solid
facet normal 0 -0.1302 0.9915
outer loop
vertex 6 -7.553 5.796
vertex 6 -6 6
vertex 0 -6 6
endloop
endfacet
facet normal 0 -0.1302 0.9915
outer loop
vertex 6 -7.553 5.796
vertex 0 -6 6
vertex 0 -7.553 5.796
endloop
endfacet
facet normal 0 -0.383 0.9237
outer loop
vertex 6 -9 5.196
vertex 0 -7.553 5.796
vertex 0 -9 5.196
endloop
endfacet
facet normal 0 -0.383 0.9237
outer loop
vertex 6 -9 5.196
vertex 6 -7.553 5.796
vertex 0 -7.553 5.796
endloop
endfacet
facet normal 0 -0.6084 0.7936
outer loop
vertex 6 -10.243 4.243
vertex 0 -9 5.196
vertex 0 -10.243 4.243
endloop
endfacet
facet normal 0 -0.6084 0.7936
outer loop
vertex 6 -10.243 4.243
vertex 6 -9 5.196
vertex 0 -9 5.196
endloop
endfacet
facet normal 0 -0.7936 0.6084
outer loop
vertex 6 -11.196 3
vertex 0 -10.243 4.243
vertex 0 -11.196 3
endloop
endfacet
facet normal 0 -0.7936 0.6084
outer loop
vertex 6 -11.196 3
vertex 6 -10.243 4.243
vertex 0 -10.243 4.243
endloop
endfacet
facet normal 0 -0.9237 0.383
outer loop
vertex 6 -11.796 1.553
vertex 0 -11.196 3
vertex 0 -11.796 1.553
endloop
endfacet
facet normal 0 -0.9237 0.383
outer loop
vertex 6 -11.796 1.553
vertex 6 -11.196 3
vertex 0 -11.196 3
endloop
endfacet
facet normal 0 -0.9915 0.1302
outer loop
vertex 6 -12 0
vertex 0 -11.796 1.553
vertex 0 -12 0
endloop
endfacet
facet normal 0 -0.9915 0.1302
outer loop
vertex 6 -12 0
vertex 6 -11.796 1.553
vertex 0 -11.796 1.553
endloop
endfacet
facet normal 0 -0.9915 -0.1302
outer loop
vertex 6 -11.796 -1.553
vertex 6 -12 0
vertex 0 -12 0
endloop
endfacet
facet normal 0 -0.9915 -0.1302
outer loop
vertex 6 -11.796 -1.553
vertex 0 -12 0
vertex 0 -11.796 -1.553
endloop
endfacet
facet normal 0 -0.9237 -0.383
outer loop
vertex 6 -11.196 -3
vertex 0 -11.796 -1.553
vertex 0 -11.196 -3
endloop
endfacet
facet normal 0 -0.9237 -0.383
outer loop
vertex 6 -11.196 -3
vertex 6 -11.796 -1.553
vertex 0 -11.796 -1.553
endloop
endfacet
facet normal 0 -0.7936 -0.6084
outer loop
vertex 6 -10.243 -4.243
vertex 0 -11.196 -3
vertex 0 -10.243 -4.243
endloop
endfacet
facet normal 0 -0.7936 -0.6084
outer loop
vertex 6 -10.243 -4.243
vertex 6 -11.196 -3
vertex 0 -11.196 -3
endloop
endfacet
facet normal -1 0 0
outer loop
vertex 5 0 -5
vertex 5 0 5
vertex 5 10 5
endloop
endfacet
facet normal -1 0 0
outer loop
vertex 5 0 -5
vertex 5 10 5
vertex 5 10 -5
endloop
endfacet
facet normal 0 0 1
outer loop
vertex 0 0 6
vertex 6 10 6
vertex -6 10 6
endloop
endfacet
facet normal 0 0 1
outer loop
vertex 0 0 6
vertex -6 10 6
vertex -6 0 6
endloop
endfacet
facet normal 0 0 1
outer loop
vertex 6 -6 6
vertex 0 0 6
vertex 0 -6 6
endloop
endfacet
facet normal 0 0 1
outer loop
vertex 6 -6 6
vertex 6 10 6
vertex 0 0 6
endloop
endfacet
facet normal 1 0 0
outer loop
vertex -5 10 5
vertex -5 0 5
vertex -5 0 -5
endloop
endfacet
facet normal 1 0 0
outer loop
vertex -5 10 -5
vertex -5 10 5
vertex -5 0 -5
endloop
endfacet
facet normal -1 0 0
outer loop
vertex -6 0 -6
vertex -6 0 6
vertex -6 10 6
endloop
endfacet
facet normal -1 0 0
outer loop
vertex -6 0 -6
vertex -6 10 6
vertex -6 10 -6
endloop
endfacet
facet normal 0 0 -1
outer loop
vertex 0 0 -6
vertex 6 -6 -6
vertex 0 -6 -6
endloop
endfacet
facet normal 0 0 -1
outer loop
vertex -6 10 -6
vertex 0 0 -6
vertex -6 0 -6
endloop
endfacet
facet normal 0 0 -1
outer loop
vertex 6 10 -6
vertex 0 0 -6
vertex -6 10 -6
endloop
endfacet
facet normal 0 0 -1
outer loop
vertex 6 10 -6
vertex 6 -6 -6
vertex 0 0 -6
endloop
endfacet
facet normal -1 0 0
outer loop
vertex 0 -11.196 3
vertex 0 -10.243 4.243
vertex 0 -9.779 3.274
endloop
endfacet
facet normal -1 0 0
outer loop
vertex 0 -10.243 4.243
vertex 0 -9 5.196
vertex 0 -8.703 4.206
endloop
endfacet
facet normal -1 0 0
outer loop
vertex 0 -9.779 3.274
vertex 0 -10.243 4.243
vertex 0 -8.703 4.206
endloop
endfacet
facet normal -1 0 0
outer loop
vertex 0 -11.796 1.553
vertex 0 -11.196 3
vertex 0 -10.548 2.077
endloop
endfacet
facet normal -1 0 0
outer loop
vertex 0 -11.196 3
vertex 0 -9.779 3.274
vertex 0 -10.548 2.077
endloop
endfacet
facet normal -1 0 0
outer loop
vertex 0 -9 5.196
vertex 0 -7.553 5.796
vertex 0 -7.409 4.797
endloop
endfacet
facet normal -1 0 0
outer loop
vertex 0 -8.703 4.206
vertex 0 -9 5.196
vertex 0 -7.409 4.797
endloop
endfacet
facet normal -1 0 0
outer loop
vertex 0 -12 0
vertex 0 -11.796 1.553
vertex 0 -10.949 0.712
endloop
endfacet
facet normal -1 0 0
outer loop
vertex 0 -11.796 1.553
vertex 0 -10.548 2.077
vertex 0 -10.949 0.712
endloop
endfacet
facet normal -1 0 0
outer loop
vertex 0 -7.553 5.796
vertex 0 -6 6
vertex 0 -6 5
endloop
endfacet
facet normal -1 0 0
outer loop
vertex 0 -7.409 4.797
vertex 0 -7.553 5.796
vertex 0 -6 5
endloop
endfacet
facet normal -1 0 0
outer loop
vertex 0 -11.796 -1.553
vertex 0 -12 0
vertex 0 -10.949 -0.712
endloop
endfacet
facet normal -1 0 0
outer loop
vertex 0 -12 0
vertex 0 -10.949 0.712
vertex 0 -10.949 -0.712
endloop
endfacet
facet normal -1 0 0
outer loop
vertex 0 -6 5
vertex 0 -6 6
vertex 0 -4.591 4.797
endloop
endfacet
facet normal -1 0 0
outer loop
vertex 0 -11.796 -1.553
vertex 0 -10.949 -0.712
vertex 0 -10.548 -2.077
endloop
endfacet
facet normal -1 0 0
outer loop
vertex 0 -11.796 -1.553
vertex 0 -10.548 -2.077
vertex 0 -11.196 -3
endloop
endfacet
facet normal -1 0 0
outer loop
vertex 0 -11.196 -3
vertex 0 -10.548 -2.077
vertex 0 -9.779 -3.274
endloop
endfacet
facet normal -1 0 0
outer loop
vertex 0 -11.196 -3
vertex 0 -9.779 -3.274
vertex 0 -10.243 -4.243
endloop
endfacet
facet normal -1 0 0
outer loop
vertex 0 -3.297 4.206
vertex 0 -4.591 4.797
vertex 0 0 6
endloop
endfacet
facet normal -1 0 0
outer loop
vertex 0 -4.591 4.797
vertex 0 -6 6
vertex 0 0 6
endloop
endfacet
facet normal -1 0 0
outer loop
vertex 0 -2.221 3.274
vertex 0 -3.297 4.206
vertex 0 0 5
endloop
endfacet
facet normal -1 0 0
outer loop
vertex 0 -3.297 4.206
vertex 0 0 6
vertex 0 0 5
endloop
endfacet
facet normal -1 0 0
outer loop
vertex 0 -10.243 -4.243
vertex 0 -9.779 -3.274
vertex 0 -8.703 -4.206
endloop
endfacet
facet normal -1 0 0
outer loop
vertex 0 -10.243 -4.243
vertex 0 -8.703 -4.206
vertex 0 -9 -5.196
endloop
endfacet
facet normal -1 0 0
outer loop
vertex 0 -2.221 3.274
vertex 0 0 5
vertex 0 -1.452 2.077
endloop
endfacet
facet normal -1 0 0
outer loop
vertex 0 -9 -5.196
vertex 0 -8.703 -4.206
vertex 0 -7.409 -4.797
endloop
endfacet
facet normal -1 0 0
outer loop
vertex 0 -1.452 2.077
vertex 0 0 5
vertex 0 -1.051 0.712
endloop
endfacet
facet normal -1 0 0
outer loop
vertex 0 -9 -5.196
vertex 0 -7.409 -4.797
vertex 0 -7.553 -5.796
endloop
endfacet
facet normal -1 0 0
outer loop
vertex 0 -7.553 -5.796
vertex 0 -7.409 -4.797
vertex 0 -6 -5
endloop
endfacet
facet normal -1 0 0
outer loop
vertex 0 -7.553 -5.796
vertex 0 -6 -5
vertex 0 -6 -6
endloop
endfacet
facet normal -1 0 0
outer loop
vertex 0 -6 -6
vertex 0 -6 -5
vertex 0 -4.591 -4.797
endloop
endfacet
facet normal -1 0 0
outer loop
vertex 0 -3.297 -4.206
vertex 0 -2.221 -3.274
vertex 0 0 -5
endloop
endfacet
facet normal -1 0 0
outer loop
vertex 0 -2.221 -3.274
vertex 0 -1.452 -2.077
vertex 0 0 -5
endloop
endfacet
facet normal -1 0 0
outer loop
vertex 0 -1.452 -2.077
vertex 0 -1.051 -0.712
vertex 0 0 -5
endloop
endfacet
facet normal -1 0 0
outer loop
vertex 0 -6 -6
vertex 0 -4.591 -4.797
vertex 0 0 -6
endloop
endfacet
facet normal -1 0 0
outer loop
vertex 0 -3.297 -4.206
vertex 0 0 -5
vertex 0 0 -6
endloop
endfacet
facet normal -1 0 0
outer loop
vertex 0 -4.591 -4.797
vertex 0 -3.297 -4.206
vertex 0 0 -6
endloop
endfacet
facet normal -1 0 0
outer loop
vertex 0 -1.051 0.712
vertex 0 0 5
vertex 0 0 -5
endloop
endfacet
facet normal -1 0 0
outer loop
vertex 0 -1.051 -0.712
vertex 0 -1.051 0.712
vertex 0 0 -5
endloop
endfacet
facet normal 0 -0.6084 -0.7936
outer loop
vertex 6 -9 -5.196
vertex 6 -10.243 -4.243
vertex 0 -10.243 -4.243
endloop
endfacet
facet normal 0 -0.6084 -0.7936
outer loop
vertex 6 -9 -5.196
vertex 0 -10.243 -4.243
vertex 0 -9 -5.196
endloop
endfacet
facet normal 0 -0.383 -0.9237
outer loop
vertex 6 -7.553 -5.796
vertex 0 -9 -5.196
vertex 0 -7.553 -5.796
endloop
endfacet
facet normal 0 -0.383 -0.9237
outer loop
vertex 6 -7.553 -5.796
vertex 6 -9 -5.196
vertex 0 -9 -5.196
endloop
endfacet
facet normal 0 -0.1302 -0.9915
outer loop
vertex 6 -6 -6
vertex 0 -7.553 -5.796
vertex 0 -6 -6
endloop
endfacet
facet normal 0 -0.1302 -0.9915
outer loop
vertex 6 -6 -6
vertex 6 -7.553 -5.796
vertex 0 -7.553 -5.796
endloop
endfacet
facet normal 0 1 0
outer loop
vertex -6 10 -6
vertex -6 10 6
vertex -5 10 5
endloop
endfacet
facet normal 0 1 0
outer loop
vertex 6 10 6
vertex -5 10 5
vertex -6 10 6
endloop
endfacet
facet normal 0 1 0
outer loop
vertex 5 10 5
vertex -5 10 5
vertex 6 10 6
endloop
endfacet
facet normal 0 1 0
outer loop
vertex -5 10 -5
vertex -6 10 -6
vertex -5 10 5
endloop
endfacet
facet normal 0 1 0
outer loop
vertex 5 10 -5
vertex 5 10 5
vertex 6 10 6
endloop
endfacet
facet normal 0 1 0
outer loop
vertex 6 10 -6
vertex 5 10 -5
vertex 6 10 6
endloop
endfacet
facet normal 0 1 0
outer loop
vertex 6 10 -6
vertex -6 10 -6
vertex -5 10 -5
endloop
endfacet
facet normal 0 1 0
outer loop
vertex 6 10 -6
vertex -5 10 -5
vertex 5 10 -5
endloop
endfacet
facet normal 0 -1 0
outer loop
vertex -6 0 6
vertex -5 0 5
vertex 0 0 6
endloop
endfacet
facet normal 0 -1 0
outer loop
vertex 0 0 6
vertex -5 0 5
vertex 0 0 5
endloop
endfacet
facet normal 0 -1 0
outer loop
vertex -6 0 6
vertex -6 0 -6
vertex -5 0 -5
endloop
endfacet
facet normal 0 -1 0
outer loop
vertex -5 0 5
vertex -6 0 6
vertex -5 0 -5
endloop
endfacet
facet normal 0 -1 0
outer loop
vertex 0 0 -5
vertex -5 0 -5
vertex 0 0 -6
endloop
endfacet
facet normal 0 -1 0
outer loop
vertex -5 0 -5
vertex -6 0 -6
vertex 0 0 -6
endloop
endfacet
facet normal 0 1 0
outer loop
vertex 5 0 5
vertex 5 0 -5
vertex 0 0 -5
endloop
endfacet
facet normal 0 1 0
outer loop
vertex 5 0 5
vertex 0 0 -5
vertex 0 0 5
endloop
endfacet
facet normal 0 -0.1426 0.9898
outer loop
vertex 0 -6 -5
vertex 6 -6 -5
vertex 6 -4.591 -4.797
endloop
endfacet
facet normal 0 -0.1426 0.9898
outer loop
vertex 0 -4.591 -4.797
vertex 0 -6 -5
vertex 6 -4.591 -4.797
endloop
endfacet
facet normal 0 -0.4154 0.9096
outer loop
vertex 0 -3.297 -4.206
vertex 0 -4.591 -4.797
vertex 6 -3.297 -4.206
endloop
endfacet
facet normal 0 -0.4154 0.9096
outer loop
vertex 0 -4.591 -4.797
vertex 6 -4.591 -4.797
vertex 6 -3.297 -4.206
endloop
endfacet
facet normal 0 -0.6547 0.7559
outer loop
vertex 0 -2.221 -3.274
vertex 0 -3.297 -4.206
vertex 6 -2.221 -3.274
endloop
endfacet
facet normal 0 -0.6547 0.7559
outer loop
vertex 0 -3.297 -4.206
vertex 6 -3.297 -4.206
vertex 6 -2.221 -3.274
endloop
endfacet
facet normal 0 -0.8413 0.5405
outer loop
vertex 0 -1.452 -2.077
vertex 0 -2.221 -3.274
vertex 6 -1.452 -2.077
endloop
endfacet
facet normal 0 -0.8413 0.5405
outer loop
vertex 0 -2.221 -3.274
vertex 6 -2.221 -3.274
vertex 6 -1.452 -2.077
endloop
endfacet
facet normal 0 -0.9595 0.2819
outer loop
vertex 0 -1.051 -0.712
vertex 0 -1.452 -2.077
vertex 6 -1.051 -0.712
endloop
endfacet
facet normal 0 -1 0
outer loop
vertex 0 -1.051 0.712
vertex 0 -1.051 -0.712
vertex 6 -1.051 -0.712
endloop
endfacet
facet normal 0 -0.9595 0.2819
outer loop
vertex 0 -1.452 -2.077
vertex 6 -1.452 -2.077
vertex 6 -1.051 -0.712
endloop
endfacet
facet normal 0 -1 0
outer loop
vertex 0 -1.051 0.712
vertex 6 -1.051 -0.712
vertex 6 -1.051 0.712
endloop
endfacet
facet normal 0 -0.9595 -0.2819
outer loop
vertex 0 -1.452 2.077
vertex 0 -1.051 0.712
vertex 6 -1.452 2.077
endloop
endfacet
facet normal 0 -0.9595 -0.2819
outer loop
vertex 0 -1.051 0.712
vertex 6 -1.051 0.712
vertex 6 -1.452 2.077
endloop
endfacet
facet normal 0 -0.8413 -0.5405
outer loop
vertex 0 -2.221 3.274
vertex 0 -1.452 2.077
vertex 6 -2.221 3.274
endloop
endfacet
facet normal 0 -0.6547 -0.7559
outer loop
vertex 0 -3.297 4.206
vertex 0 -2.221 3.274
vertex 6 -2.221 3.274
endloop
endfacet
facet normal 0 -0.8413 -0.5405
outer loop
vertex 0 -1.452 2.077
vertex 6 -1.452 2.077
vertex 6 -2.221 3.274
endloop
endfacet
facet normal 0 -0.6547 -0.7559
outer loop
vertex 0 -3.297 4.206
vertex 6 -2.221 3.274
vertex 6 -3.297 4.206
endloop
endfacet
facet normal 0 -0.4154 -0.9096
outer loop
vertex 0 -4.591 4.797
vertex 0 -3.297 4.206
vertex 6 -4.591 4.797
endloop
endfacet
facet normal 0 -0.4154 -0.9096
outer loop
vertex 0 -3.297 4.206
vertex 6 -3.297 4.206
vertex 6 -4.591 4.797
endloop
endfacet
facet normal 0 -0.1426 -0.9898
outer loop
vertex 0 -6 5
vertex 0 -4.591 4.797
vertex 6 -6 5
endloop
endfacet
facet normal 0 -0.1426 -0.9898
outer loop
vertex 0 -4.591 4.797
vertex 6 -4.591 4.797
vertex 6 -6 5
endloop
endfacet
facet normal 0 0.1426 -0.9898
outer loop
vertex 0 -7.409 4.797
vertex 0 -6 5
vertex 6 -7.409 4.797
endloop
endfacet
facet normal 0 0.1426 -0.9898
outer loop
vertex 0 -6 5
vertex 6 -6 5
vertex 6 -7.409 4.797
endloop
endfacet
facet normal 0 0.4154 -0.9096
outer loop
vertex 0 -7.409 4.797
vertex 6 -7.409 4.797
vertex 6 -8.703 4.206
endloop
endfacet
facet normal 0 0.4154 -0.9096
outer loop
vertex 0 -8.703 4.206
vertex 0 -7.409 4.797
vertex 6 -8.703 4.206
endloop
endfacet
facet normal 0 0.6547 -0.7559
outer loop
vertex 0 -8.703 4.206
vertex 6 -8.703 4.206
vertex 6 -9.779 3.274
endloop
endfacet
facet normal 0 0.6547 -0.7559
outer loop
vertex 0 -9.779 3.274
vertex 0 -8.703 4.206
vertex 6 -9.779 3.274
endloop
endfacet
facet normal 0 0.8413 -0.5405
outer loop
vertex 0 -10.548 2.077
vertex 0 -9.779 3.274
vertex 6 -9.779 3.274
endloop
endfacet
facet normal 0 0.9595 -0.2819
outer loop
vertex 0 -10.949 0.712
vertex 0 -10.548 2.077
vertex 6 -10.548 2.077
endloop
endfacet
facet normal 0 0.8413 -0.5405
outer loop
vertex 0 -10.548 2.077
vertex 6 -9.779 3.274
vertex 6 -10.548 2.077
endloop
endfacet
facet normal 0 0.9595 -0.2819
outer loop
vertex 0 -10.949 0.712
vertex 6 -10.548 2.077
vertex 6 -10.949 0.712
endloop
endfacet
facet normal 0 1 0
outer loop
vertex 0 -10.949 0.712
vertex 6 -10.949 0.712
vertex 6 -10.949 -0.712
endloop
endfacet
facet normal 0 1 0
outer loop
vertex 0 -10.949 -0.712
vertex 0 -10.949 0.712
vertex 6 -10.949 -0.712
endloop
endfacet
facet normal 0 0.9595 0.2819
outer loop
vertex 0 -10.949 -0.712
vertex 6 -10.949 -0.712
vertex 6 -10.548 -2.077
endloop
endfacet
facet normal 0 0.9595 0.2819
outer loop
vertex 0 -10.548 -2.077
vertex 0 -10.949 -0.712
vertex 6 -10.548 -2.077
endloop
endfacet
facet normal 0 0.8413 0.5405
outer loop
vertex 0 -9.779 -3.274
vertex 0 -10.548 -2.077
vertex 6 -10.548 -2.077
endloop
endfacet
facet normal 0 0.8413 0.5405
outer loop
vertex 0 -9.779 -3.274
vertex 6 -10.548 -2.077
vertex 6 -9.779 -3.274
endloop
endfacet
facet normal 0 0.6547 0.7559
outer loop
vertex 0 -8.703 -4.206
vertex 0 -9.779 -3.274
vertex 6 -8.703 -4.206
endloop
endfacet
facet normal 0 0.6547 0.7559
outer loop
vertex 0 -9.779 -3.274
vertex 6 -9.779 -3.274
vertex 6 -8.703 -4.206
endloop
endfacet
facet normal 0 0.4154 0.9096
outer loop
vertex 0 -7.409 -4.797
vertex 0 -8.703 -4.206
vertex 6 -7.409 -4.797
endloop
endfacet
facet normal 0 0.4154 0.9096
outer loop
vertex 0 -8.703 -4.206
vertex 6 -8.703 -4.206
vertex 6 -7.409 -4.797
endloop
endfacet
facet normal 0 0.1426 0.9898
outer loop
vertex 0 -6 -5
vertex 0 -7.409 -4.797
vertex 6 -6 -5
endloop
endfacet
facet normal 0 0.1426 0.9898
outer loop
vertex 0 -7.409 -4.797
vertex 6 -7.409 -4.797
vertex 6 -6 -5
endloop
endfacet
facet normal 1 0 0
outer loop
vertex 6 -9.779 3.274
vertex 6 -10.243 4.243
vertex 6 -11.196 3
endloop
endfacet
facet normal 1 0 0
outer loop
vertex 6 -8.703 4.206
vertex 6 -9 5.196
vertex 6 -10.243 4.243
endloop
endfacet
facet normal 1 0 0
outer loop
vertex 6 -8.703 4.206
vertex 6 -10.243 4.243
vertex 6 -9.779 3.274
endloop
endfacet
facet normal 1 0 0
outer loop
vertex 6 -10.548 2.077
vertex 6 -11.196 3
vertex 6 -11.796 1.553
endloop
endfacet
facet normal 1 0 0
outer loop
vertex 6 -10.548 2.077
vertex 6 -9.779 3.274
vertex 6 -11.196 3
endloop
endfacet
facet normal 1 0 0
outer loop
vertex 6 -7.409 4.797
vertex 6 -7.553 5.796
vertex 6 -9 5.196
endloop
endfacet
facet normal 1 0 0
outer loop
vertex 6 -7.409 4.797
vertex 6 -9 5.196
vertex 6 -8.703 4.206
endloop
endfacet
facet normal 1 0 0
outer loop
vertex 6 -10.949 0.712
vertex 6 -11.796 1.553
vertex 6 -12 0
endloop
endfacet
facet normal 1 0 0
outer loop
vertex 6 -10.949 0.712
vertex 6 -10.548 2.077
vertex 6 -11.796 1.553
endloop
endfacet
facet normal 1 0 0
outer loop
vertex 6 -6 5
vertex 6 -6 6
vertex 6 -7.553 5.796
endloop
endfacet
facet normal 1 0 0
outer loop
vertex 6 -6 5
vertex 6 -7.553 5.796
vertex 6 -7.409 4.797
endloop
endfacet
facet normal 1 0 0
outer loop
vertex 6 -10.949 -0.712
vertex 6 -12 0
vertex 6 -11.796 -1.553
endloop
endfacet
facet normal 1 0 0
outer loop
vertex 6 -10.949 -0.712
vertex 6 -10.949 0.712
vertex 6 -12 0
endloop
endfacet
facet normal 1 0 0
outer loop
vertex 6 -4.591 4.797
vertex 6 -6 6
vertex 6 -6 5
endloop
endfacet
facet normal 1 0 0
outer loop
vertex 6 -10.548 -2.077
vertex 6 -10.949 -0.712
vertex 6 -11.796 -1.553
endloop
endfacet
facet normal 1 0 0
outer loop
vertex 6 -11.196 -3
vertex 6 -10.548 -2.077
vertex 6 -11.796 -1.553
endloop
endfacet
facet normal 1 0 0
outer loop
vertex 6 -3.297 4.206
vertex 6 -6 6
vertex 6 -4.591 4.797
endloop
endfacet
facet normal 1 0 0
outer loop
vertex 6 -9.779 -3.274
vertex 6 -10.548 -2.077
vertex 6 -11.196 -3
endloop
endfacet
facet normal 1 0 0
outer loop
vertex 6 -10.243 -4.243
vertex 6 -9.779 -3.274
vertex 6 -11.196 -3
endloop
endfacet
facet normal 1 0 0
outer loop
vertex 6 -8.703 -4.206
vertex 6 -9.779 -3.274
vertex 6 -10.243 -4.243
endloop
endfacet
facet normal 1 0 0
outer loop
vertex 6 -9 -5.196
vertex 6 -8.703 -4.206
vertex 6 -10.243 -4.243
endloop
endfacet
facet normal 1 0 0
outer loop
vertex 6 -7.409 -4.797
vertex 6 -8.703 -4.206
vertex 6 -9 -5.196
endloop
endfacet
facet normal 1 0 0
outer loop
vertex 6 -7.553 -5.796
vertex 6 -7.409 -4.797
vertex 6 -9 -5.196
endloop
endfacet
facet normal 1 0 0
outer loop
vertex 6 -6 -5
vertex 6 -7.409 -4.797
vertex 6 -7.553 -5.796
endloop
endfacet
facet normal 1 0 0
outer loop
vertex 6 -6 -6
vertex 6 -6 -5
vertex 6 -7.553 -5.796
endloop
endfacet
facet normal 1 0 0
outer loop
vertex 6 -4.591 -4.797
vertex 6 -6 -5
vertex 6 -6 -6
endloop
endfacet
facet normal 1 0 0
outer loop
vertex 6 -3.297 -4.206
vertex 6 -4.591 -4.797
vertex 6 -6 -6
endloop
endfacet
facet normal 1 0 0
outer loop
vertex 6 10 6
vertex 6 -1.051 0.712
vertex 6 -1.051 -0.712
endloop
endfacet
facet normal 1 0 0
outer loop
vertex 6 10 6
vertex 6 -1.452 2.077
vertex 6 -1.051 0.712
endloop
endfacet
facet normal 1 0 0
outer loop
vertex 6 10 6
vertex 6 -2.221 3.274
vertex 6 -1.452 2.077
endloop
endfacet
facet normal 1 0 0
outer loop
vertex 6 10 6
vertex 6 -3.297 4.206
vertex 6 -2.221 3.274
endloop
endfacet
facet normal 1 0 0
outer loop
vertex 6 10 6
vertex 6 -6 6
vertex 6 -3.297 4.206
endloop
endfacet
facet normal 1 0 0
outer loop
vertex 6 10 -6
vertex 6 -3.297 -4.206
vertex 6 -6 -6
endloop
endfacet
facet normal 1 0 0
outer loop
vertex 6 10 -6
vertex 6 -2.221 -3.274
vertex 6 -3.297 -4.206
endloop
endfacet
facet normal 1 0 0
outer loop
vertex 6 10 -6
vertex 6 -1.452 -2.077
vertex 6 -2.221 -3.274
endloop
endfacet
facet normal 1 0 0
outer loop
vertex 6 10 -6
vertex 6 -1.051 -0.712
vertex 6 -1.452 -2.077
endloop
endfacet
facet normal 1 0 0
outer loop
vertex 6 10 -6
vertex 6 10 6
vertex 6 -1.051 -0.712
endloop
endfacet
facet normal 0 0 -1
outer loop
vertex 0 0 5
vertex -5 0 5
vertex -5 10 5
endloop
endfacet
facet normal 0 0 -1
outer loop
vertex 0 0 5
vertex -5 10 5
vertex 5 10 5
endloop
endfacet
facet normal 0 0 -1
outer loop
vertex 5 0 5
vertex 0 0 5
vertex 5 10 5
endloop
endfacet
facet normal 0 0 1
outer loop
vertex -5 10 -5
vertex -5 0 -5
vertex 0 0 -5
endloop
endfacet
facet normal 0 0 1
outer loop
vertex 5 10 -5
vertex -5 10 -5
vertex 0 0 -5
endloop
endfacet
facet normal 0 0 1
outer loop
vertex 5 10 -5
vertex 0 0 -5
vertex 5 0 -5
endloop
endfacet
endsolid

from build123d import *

# Parameters (mm, degrees)
SKETCH_1_W          = 12
SKETCH_1_H          = 12
SKETCH_1_W_2        = 10
SKETCH_1_H_2        = 10
EXTRUDE_1_DEPTH     = 10
EXTRUDE_2_DEPTH     = 6
SKETCH_4_R          = 5
CUT_EXTRUDE_1_DEPTH = 6


with BuildPart() as part:
    # 草图1 → 凸台-拉伸1 (new body)
    with BuildSketch(Plane(origin=(0, 0, 0), x_dir=(1, 0, 0), z_dir=(0, 1, 0))):
        Rectangle(SKETCH_1_W, SKETCH_1_H)
        Rectangle(SKETCH_1_W_2, SKETCH_1_H_2, mode=Mode.SUBTRACT)
    extrude(amount=EXTRUDE_1_DEPTH)

    # 草图3 → 凸台-拉伸2 (add)
    with BuildSketch(Plane(origin=(6, 0, 0), x_dir=(0, 0, -1), z_dir=(1, 0, 0))):
        Polygon((0, -6), (-6, 0), (-6, -6), align=None)
        Polygon((6, 0), (-6, 0), (0, -6), (6, -6), align=None)
        with BuildLine():
            Line((0, -6), (-6, -6))
            ThreePointArc((-6, -6), (-4.242640687, -10.242640687), (0, -12))
            ThreePointArc((0, -12), (2.296100594, -11.543277195), (4.242640687, -10.242640687))
            Line((4.242640687, -10.242640687), (0, -6))
        make_face()
        with BuildLine():
            Line((6, -6), (0, -6))
            Line((0, -6), (4.242640687, -10.242640687))
            ThreePointArc((4.242640687, -10.242640687), (5.543277195, -8.296100594), (6, -6))
        make_face()
    extrude(amount=-EXTRUDE_2_DEPTH)

    # 草图4 → 切除-拉伸1 (cut)
    with BuildSketch(Plane(origin=(6, 0, 0), x_dir=(0, 0, -1), z_dir=(1, 0, 0))):
        with Locations((0, -6)):
            Circle(SKETCH_4_R)
    extrude(amount=-CUT_EXTRUDE_1_DEPTH, mode=Mode.SUBTRACT)


solid = part.part
